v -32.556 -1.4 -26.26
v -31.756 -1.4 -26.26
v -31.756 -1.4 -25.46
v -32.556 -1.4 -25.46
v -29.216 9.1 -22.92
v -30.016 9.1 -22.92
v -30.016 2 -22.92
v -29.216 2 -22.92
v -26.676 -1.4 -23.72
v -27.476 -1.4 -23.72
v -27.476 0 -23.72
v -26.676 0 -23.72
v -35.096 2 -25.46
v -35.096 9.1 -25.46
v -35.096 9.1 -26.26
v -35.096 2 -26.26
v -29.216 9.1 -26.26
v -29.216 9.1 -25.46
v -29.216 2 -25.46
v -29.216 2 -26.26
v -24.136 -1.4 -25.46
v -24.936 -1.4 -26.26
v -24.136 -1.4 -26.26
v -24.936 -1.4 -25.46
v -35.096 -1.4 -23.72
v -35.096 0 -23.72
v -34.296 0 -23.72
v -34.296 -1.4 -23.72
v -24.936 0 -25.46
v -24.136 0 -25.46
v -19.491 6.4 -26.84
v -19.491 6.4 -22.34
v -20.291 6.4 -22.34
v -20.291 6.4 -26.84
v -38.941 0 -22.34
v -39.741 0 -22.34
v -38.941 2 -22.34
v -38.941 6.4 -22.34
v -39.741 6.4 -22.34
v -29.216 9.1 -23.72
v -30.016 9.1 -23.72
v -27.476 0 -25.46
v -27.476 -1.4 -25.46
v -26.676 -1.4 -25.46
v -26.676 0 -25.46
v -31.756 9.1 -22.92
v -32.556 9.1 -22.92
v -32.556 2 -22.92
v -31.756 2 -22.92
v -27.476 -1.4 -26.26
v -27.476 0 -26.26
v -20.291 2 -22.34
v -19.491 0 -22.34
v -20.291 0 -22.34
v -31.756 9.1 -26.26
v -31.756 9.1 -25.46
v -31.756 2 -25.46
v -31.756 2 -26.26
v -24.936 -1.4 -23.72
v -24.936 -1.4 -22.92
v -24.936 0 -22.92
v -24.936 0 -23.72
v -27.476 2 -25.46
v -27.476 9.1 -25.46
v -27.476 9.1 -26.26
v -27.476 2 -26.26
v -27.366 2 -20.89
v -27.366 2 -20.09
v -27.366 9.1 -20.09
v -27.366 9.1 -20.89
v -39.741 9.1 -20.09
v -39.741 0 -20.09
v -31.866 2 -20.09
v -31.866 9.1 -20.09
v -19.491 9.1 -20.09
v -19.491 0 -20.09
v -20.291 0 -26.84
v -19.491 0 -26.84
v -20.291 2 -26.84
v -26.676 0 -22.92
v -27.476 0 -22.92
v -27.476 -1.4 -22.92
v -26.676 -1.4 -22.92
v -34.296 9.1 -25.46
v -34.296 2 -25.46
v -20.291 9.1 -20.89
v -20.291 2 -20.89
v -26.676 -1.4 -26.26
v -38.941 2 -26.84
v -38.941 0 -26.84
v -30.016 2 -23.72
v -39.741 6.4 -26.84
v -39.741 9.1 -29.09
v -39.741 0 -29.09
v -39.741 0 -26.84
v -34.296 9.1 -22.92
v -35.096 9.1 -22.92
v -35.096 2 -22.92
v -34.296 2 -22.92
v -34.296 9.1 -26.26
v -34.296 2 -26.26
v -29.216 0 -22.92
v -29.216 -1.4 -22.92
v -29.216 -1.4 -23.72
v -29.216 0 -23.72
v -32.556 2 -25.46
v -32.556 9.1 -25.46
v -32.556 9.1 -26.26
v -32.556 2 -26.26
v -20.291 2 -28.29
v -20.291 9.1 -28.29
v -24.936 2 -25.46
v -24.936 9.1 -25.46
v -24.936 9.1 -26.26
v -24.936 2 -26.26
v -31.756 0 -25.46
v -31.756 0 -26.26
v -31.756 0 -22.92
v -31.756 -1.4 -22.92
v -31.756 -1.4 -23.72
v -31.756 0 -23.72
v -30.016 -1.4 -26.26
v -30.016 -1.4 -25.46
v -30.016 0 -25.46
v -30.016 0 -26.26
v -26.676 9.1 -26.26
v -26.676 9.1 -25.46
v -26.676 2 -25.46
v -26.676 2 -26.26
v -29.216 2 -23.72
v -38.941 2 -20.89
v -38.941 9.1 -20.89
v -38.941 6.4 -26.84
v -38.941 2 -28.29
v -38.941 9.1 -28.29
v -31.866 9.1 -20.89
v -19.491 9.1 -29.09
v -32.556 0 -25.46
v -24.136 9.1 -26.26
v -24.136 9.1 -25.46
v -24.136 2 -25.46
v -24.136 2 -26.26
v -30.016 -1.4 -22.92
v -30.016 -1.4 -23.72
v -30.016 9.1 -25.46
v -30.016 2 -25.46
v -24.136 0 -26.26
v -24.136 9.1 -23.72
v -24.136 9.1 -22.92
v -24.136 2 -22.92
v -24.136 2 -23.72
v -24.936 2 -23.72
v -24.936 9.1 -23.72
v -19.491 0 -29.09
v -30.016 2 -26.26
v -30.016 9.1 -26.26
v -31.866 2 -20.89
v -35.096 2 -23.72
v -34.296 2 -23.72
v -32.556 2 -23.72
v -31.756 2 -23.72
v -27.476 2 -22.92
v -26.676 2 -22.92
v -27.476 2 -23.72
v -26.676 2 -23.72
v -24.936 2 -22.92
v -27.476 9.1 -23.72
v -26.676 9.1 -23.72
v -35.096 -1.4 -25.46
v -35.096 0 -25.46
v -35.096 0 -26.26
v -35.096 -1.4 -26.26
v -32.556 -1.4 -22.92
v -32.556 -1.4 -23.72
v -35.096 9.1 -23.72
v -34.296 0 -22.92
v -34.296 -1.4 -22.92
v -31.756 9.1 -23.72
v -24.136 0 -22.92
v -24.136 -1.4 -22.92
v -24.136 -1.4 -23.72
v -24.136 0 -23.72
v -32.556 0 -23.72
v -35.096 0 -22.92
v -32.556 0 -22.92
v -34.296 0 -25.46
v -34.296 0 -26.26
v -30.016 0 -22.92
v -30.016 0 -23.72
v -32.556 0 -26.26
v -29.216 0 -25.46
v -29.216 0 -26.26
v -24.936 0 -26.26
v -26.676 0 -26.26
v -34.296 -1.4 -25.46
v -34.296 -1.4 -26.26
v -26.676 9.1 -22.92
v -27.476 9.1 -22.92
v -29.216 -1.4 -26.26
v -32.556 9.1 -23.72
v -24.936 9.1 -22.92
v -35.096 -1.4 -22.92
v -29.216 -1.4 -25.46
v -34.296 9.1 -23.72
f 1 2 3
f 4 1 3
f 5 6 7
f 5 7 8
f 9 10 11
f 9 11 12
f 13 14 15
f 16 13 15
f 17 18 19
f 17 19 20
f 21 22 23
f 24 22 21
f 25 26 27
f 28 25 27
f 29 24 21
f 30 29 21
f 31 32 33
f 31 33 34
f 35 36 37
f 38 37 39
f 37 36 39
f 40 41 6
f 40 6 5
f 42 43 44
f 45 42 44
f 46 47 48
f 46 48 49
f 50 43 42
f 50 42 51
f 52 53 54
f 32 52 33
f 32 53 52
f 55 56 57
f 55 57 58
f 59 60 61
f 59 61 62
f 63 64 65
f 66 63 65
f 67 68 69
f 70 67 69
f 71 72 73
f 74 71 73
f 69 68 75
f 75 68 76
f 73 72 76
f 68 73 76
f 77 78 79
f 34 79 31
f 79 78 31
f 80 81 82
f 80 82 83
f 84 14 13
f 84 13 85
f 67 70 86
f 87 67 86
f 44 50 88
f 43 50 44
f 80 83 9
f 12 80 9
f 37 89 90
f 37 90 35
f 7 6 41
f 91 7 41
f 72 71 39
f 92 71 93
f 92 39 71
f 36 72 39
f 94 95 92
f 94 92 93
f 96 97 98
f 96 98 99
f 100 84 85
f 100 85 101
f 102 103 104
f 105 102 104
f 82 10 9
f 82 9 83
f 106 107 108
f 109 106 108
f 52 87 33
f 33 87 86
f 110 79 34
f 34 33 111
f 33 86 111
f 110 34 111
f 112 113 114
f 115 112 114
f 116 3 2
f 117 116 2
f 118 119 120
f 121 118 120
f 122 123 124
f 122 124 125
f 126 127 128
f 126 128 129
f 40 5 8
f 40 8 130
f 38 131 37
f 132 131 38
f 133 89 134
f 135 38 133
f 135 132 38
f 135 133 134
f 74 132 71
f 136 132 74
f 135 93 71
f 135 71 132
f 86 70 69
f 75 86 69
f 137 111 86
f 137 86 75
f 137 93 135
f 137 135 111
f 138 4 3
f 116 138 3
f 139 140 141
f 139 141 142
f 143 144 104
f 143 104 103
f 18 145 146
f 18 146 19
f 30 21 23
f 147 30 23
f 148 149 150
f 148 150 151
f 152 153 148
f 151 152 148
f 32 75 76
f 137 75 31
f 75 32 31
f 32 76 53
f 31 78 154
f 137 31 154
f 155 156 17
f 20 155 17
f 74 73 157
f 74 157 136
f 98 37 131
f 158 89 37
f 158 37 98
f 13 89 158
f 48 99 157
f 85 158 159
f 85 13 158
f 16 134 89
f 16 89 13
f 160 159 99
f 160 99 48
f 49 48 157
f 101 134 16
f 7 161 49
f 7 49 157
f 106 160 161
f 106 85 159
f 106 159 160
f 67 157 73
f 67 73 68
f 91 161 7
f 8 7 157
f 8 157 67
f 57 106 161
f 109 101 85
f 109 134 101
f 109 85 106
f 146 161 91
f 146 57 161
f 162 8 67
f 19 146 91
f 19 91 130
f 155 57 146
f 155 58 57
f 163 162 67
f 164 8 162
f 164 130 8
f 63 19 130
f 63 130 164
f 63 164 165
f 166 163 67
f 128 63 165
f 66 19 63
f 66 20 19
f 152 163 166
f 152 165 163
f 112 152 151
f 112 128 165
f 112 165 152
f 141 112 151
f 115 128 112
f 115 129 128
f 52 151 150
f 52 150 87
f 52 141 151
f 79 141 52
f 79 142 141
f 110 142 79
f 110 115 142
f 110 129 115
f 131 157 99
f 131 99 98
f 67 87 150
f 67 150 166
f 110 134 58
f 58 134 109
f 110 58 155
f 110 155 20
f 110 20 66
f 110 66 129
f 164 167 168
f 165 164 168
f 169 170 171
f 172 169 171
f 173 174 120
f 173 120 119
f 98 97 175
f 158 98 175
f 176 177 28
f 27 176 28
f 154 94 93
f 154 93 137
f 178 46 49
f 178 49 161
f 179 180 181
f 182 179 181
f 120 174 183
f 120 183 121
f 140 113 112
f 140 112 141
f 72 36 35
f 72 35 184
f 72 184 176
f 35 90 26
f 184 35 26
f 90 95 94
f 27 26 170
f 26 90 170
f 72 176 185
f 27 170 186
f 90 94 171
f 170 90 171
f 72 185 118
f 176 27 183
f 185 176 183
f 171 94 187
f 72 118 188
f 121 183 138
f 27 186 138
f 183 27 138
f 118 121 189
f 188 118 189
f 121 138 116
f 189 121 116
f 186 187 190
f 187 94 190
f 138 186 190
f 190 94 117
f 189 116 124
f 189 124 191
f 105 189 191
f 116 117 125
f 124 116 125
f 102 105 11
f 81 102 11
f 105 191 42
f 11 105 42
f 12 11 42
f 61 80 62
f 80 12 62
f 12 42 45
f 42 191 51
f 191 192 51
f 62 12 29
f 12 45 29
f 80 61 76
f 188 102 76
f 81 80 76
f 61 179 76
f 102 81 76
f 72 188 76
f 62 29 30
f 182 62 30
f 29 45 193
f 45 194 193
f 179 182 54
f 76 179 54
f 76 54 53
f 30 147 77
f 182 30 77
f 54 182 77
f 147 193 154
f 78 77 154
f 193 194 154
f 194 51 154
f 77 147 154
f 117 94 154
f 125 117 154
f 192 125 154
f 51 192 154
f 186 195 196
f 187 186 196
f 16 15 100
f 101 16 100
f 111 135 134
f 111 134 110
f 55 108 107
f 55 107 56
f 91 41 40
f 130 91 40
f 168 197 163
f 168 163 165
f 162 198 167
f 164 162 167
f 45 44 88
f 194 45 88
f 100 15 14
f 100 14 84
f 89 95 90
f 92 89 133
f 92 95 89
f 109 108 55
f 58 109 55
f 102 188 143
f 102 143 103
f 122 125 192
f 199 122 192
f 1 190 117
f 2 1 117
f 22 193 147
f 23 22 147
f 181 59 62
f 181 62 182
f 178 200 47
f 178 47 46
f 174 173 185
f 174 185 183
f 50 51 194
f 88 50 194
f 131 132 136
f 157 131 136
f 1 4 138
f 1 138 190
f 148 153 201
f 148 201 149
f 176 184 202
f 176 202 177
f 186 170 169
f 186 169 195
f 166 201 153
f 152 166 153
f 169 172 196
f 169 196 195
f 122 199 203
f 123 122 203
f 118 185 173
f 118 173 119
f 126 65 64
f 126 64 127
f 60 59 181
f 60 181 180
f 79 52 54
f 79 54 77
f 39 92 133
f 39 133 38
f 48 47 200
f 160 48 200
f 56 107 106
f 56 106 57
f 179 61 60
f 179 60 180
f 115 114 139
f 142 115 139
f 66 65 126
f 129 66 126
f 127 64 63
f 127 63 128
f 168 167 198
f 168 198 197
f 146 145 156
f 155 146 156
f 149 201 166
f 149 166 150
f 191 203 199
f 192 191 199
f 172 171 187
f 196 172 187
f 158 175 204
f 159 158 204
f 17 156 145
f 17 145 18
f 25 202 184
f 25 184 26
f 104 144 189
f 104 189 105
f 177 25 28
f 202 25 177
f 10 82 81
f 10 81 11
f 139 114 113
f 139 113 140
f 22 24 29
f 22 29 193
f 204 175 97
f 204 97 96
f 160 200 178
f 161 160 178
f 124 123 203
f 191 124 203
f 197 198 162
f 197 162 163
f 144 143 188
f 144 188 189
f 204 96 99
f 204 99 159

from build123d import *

# Parameters (mm, degrees)
SKETCH1_W           = 20.25
SKETCH1_H           = 9
BOSS_EXTRUDE1_DEPTH = 9.1
SKETCH2_W           = 18.65
SKETCH2_H           = 7.4
CUT_EXTRUDE1_DEPTH  = 7.1
SKETCH2_3_W         = 0.8
SKETCH2_3_H         = 0.8
BOSS_EXTRUDE2_DEPTH = 12.5
SKETCH3_W           = 4.5
SKETCH3_H           = 7.1
CUT_EXTRUDE2_DEPTH  = 2.1
SKETCH5_W           = 4.5
SKETCH5_H           = 6.4
CUT_EXTRUDE3_DEPTH  = 0.8
SKETCH6_W           = 4.5
SKETCH6_H           = 6.4
CUT_EXTRUDE4_DEPTH  = 0.8
SKETCH8_W           = 3.34
SKETCH8_H           = 2
CUT_EXTRUDE5_DEPTH  = 35.242661924


with BuildPart() as part:
    # Sketch1 → Boss-Extrude1 (new body)
    with BuildSketch(Plane(origin=(0, 0, 0), x_dir=(1, 0, 0), z_dir=(0, 1, 0))):
        with Locations((-29.615572658, 24.590099186)):
            Rectangle(SKETCH1_W, SKETCH1_H)
    extrude(amount=BOSS_EXTRUDE1_DEPTH)

    # Sketch2 → Cut-Extrude1 (cut)
    with BuildSketch(Plane(origin=(0, 9.1, 0), x_dir=(1, 0, 0), z_dir=(0, 1, 0))):
        with Locations((-29.615572658, 24.590099186)):
            Rectangle(SKETCH2_W, SKETCH2_H)
    extrude(amount=-CUT_EXTRUDE1_DEPTH, mode=Mode.SUBTRACT)

    # Sketch2<3> → Boss-Extrude2 (add)
    with BuildSketch(Plane(origin=(0, 9.1, 0), x_dir=(1, 0, 0), z_dir=(0, 1, 0))):
        with Locations((-32.155572658, 23.320099186)):
            Rectangle(SKETCH2_3_W, SKETCH2_3_H)
        with Locations((-29.615572658, 23.320099186)):
            Rectangle(SKETCH2_3_W, SKETCH2_3_H)
        with Locations((-27.075572658, 23.320099186)):
            Rectangle(SKETCH2_3_W, SKETCH2_3_H)
        with Locations((-24.535572658, 23.320099186)):
            Rectangle(SKETCH2_3_W, SKETCH2_3_H)
        with Locations((-29.615572658, 25.860099186)):
            Rectangle(SKETCH2_3_W, SKETCH2_3_H)
        with Locations((-27.075572658, 25.860099186)):
            Rectangle(SKETCH2_3_W, SKETCH2_3_H)
        with Locations((-24.535572658, 25.860099186)):
            Rectangle(SKETCH2_3_W, SKETCH2_3_H)
        with Locations((-32.155572658, 25.860099186)):
            Rectangle(SKETCH2_3_W, SKETCH2_3_H)
        with Locations((-34.695572658, 23.320099186)):
            Rectangle(SKETCH2_3_W, SKETCH2_3_H)
        with Locations((-34.695572658, 25.860099186)):
            Rectangle(SKETCH2_3_W, SKETCH2_3_H)
    extrude(amount=-BOSS_EXTRUDE2_DEPTH)

    # Sketch3 → Cut-Extrude2 (cut)
    with BuildSketch(Plane.XY.offset(-20.090099186)):
        with Locations((-29.615572658, 5.55)):
            Rectangle(SKETCH3_W, SKETCH3_H)
    extrude(amount=-CUT_EXTRUDE2_DEPTH, mode=Mode.SUBTRACT)

    # Sketch5 → Cut-Extrude3 (cut)
    with BuildSketch(Plane.ZY.offset(39.740572658)):
        with Locations((-24.590099186, 3.2)):
            Rectangle(SKETCH5_W, SKETCH5_H)
    extrude(amount=-CUT_EXTRUDE3_DEPTH, mode=Mode.SUBTRACT)

    # Sketch6 → Cut-Extrude4 (cut)
    with BuildSketch(Plane(origin=(-19.490572658, 0, 0), x_dir=(0, 0, -1), z_dir=(1, 0, 0))):
        with Locations((24.590099186, 3.2)):
            Rectangle(SKETCH6_W, SKETCH6_H)
    extrude(amount=-CUT_EXTRUDE4_DEPTH, mode=Mode.SUBTRACT)

    # Sketch8 → Cut-Extrude5 (cut, through all)
    with BuildSketch(Plane.ZY.offset(35.095572658)):
        with Locations((-24.590099186, -2.4)):
            Rectangle(SKETCH8_W, SKETCH8_H)
    extrude(amount=-CUT_EXTRUDE5_DEPTH, mode=Mode.SUBTRACT)


solid = part.part
